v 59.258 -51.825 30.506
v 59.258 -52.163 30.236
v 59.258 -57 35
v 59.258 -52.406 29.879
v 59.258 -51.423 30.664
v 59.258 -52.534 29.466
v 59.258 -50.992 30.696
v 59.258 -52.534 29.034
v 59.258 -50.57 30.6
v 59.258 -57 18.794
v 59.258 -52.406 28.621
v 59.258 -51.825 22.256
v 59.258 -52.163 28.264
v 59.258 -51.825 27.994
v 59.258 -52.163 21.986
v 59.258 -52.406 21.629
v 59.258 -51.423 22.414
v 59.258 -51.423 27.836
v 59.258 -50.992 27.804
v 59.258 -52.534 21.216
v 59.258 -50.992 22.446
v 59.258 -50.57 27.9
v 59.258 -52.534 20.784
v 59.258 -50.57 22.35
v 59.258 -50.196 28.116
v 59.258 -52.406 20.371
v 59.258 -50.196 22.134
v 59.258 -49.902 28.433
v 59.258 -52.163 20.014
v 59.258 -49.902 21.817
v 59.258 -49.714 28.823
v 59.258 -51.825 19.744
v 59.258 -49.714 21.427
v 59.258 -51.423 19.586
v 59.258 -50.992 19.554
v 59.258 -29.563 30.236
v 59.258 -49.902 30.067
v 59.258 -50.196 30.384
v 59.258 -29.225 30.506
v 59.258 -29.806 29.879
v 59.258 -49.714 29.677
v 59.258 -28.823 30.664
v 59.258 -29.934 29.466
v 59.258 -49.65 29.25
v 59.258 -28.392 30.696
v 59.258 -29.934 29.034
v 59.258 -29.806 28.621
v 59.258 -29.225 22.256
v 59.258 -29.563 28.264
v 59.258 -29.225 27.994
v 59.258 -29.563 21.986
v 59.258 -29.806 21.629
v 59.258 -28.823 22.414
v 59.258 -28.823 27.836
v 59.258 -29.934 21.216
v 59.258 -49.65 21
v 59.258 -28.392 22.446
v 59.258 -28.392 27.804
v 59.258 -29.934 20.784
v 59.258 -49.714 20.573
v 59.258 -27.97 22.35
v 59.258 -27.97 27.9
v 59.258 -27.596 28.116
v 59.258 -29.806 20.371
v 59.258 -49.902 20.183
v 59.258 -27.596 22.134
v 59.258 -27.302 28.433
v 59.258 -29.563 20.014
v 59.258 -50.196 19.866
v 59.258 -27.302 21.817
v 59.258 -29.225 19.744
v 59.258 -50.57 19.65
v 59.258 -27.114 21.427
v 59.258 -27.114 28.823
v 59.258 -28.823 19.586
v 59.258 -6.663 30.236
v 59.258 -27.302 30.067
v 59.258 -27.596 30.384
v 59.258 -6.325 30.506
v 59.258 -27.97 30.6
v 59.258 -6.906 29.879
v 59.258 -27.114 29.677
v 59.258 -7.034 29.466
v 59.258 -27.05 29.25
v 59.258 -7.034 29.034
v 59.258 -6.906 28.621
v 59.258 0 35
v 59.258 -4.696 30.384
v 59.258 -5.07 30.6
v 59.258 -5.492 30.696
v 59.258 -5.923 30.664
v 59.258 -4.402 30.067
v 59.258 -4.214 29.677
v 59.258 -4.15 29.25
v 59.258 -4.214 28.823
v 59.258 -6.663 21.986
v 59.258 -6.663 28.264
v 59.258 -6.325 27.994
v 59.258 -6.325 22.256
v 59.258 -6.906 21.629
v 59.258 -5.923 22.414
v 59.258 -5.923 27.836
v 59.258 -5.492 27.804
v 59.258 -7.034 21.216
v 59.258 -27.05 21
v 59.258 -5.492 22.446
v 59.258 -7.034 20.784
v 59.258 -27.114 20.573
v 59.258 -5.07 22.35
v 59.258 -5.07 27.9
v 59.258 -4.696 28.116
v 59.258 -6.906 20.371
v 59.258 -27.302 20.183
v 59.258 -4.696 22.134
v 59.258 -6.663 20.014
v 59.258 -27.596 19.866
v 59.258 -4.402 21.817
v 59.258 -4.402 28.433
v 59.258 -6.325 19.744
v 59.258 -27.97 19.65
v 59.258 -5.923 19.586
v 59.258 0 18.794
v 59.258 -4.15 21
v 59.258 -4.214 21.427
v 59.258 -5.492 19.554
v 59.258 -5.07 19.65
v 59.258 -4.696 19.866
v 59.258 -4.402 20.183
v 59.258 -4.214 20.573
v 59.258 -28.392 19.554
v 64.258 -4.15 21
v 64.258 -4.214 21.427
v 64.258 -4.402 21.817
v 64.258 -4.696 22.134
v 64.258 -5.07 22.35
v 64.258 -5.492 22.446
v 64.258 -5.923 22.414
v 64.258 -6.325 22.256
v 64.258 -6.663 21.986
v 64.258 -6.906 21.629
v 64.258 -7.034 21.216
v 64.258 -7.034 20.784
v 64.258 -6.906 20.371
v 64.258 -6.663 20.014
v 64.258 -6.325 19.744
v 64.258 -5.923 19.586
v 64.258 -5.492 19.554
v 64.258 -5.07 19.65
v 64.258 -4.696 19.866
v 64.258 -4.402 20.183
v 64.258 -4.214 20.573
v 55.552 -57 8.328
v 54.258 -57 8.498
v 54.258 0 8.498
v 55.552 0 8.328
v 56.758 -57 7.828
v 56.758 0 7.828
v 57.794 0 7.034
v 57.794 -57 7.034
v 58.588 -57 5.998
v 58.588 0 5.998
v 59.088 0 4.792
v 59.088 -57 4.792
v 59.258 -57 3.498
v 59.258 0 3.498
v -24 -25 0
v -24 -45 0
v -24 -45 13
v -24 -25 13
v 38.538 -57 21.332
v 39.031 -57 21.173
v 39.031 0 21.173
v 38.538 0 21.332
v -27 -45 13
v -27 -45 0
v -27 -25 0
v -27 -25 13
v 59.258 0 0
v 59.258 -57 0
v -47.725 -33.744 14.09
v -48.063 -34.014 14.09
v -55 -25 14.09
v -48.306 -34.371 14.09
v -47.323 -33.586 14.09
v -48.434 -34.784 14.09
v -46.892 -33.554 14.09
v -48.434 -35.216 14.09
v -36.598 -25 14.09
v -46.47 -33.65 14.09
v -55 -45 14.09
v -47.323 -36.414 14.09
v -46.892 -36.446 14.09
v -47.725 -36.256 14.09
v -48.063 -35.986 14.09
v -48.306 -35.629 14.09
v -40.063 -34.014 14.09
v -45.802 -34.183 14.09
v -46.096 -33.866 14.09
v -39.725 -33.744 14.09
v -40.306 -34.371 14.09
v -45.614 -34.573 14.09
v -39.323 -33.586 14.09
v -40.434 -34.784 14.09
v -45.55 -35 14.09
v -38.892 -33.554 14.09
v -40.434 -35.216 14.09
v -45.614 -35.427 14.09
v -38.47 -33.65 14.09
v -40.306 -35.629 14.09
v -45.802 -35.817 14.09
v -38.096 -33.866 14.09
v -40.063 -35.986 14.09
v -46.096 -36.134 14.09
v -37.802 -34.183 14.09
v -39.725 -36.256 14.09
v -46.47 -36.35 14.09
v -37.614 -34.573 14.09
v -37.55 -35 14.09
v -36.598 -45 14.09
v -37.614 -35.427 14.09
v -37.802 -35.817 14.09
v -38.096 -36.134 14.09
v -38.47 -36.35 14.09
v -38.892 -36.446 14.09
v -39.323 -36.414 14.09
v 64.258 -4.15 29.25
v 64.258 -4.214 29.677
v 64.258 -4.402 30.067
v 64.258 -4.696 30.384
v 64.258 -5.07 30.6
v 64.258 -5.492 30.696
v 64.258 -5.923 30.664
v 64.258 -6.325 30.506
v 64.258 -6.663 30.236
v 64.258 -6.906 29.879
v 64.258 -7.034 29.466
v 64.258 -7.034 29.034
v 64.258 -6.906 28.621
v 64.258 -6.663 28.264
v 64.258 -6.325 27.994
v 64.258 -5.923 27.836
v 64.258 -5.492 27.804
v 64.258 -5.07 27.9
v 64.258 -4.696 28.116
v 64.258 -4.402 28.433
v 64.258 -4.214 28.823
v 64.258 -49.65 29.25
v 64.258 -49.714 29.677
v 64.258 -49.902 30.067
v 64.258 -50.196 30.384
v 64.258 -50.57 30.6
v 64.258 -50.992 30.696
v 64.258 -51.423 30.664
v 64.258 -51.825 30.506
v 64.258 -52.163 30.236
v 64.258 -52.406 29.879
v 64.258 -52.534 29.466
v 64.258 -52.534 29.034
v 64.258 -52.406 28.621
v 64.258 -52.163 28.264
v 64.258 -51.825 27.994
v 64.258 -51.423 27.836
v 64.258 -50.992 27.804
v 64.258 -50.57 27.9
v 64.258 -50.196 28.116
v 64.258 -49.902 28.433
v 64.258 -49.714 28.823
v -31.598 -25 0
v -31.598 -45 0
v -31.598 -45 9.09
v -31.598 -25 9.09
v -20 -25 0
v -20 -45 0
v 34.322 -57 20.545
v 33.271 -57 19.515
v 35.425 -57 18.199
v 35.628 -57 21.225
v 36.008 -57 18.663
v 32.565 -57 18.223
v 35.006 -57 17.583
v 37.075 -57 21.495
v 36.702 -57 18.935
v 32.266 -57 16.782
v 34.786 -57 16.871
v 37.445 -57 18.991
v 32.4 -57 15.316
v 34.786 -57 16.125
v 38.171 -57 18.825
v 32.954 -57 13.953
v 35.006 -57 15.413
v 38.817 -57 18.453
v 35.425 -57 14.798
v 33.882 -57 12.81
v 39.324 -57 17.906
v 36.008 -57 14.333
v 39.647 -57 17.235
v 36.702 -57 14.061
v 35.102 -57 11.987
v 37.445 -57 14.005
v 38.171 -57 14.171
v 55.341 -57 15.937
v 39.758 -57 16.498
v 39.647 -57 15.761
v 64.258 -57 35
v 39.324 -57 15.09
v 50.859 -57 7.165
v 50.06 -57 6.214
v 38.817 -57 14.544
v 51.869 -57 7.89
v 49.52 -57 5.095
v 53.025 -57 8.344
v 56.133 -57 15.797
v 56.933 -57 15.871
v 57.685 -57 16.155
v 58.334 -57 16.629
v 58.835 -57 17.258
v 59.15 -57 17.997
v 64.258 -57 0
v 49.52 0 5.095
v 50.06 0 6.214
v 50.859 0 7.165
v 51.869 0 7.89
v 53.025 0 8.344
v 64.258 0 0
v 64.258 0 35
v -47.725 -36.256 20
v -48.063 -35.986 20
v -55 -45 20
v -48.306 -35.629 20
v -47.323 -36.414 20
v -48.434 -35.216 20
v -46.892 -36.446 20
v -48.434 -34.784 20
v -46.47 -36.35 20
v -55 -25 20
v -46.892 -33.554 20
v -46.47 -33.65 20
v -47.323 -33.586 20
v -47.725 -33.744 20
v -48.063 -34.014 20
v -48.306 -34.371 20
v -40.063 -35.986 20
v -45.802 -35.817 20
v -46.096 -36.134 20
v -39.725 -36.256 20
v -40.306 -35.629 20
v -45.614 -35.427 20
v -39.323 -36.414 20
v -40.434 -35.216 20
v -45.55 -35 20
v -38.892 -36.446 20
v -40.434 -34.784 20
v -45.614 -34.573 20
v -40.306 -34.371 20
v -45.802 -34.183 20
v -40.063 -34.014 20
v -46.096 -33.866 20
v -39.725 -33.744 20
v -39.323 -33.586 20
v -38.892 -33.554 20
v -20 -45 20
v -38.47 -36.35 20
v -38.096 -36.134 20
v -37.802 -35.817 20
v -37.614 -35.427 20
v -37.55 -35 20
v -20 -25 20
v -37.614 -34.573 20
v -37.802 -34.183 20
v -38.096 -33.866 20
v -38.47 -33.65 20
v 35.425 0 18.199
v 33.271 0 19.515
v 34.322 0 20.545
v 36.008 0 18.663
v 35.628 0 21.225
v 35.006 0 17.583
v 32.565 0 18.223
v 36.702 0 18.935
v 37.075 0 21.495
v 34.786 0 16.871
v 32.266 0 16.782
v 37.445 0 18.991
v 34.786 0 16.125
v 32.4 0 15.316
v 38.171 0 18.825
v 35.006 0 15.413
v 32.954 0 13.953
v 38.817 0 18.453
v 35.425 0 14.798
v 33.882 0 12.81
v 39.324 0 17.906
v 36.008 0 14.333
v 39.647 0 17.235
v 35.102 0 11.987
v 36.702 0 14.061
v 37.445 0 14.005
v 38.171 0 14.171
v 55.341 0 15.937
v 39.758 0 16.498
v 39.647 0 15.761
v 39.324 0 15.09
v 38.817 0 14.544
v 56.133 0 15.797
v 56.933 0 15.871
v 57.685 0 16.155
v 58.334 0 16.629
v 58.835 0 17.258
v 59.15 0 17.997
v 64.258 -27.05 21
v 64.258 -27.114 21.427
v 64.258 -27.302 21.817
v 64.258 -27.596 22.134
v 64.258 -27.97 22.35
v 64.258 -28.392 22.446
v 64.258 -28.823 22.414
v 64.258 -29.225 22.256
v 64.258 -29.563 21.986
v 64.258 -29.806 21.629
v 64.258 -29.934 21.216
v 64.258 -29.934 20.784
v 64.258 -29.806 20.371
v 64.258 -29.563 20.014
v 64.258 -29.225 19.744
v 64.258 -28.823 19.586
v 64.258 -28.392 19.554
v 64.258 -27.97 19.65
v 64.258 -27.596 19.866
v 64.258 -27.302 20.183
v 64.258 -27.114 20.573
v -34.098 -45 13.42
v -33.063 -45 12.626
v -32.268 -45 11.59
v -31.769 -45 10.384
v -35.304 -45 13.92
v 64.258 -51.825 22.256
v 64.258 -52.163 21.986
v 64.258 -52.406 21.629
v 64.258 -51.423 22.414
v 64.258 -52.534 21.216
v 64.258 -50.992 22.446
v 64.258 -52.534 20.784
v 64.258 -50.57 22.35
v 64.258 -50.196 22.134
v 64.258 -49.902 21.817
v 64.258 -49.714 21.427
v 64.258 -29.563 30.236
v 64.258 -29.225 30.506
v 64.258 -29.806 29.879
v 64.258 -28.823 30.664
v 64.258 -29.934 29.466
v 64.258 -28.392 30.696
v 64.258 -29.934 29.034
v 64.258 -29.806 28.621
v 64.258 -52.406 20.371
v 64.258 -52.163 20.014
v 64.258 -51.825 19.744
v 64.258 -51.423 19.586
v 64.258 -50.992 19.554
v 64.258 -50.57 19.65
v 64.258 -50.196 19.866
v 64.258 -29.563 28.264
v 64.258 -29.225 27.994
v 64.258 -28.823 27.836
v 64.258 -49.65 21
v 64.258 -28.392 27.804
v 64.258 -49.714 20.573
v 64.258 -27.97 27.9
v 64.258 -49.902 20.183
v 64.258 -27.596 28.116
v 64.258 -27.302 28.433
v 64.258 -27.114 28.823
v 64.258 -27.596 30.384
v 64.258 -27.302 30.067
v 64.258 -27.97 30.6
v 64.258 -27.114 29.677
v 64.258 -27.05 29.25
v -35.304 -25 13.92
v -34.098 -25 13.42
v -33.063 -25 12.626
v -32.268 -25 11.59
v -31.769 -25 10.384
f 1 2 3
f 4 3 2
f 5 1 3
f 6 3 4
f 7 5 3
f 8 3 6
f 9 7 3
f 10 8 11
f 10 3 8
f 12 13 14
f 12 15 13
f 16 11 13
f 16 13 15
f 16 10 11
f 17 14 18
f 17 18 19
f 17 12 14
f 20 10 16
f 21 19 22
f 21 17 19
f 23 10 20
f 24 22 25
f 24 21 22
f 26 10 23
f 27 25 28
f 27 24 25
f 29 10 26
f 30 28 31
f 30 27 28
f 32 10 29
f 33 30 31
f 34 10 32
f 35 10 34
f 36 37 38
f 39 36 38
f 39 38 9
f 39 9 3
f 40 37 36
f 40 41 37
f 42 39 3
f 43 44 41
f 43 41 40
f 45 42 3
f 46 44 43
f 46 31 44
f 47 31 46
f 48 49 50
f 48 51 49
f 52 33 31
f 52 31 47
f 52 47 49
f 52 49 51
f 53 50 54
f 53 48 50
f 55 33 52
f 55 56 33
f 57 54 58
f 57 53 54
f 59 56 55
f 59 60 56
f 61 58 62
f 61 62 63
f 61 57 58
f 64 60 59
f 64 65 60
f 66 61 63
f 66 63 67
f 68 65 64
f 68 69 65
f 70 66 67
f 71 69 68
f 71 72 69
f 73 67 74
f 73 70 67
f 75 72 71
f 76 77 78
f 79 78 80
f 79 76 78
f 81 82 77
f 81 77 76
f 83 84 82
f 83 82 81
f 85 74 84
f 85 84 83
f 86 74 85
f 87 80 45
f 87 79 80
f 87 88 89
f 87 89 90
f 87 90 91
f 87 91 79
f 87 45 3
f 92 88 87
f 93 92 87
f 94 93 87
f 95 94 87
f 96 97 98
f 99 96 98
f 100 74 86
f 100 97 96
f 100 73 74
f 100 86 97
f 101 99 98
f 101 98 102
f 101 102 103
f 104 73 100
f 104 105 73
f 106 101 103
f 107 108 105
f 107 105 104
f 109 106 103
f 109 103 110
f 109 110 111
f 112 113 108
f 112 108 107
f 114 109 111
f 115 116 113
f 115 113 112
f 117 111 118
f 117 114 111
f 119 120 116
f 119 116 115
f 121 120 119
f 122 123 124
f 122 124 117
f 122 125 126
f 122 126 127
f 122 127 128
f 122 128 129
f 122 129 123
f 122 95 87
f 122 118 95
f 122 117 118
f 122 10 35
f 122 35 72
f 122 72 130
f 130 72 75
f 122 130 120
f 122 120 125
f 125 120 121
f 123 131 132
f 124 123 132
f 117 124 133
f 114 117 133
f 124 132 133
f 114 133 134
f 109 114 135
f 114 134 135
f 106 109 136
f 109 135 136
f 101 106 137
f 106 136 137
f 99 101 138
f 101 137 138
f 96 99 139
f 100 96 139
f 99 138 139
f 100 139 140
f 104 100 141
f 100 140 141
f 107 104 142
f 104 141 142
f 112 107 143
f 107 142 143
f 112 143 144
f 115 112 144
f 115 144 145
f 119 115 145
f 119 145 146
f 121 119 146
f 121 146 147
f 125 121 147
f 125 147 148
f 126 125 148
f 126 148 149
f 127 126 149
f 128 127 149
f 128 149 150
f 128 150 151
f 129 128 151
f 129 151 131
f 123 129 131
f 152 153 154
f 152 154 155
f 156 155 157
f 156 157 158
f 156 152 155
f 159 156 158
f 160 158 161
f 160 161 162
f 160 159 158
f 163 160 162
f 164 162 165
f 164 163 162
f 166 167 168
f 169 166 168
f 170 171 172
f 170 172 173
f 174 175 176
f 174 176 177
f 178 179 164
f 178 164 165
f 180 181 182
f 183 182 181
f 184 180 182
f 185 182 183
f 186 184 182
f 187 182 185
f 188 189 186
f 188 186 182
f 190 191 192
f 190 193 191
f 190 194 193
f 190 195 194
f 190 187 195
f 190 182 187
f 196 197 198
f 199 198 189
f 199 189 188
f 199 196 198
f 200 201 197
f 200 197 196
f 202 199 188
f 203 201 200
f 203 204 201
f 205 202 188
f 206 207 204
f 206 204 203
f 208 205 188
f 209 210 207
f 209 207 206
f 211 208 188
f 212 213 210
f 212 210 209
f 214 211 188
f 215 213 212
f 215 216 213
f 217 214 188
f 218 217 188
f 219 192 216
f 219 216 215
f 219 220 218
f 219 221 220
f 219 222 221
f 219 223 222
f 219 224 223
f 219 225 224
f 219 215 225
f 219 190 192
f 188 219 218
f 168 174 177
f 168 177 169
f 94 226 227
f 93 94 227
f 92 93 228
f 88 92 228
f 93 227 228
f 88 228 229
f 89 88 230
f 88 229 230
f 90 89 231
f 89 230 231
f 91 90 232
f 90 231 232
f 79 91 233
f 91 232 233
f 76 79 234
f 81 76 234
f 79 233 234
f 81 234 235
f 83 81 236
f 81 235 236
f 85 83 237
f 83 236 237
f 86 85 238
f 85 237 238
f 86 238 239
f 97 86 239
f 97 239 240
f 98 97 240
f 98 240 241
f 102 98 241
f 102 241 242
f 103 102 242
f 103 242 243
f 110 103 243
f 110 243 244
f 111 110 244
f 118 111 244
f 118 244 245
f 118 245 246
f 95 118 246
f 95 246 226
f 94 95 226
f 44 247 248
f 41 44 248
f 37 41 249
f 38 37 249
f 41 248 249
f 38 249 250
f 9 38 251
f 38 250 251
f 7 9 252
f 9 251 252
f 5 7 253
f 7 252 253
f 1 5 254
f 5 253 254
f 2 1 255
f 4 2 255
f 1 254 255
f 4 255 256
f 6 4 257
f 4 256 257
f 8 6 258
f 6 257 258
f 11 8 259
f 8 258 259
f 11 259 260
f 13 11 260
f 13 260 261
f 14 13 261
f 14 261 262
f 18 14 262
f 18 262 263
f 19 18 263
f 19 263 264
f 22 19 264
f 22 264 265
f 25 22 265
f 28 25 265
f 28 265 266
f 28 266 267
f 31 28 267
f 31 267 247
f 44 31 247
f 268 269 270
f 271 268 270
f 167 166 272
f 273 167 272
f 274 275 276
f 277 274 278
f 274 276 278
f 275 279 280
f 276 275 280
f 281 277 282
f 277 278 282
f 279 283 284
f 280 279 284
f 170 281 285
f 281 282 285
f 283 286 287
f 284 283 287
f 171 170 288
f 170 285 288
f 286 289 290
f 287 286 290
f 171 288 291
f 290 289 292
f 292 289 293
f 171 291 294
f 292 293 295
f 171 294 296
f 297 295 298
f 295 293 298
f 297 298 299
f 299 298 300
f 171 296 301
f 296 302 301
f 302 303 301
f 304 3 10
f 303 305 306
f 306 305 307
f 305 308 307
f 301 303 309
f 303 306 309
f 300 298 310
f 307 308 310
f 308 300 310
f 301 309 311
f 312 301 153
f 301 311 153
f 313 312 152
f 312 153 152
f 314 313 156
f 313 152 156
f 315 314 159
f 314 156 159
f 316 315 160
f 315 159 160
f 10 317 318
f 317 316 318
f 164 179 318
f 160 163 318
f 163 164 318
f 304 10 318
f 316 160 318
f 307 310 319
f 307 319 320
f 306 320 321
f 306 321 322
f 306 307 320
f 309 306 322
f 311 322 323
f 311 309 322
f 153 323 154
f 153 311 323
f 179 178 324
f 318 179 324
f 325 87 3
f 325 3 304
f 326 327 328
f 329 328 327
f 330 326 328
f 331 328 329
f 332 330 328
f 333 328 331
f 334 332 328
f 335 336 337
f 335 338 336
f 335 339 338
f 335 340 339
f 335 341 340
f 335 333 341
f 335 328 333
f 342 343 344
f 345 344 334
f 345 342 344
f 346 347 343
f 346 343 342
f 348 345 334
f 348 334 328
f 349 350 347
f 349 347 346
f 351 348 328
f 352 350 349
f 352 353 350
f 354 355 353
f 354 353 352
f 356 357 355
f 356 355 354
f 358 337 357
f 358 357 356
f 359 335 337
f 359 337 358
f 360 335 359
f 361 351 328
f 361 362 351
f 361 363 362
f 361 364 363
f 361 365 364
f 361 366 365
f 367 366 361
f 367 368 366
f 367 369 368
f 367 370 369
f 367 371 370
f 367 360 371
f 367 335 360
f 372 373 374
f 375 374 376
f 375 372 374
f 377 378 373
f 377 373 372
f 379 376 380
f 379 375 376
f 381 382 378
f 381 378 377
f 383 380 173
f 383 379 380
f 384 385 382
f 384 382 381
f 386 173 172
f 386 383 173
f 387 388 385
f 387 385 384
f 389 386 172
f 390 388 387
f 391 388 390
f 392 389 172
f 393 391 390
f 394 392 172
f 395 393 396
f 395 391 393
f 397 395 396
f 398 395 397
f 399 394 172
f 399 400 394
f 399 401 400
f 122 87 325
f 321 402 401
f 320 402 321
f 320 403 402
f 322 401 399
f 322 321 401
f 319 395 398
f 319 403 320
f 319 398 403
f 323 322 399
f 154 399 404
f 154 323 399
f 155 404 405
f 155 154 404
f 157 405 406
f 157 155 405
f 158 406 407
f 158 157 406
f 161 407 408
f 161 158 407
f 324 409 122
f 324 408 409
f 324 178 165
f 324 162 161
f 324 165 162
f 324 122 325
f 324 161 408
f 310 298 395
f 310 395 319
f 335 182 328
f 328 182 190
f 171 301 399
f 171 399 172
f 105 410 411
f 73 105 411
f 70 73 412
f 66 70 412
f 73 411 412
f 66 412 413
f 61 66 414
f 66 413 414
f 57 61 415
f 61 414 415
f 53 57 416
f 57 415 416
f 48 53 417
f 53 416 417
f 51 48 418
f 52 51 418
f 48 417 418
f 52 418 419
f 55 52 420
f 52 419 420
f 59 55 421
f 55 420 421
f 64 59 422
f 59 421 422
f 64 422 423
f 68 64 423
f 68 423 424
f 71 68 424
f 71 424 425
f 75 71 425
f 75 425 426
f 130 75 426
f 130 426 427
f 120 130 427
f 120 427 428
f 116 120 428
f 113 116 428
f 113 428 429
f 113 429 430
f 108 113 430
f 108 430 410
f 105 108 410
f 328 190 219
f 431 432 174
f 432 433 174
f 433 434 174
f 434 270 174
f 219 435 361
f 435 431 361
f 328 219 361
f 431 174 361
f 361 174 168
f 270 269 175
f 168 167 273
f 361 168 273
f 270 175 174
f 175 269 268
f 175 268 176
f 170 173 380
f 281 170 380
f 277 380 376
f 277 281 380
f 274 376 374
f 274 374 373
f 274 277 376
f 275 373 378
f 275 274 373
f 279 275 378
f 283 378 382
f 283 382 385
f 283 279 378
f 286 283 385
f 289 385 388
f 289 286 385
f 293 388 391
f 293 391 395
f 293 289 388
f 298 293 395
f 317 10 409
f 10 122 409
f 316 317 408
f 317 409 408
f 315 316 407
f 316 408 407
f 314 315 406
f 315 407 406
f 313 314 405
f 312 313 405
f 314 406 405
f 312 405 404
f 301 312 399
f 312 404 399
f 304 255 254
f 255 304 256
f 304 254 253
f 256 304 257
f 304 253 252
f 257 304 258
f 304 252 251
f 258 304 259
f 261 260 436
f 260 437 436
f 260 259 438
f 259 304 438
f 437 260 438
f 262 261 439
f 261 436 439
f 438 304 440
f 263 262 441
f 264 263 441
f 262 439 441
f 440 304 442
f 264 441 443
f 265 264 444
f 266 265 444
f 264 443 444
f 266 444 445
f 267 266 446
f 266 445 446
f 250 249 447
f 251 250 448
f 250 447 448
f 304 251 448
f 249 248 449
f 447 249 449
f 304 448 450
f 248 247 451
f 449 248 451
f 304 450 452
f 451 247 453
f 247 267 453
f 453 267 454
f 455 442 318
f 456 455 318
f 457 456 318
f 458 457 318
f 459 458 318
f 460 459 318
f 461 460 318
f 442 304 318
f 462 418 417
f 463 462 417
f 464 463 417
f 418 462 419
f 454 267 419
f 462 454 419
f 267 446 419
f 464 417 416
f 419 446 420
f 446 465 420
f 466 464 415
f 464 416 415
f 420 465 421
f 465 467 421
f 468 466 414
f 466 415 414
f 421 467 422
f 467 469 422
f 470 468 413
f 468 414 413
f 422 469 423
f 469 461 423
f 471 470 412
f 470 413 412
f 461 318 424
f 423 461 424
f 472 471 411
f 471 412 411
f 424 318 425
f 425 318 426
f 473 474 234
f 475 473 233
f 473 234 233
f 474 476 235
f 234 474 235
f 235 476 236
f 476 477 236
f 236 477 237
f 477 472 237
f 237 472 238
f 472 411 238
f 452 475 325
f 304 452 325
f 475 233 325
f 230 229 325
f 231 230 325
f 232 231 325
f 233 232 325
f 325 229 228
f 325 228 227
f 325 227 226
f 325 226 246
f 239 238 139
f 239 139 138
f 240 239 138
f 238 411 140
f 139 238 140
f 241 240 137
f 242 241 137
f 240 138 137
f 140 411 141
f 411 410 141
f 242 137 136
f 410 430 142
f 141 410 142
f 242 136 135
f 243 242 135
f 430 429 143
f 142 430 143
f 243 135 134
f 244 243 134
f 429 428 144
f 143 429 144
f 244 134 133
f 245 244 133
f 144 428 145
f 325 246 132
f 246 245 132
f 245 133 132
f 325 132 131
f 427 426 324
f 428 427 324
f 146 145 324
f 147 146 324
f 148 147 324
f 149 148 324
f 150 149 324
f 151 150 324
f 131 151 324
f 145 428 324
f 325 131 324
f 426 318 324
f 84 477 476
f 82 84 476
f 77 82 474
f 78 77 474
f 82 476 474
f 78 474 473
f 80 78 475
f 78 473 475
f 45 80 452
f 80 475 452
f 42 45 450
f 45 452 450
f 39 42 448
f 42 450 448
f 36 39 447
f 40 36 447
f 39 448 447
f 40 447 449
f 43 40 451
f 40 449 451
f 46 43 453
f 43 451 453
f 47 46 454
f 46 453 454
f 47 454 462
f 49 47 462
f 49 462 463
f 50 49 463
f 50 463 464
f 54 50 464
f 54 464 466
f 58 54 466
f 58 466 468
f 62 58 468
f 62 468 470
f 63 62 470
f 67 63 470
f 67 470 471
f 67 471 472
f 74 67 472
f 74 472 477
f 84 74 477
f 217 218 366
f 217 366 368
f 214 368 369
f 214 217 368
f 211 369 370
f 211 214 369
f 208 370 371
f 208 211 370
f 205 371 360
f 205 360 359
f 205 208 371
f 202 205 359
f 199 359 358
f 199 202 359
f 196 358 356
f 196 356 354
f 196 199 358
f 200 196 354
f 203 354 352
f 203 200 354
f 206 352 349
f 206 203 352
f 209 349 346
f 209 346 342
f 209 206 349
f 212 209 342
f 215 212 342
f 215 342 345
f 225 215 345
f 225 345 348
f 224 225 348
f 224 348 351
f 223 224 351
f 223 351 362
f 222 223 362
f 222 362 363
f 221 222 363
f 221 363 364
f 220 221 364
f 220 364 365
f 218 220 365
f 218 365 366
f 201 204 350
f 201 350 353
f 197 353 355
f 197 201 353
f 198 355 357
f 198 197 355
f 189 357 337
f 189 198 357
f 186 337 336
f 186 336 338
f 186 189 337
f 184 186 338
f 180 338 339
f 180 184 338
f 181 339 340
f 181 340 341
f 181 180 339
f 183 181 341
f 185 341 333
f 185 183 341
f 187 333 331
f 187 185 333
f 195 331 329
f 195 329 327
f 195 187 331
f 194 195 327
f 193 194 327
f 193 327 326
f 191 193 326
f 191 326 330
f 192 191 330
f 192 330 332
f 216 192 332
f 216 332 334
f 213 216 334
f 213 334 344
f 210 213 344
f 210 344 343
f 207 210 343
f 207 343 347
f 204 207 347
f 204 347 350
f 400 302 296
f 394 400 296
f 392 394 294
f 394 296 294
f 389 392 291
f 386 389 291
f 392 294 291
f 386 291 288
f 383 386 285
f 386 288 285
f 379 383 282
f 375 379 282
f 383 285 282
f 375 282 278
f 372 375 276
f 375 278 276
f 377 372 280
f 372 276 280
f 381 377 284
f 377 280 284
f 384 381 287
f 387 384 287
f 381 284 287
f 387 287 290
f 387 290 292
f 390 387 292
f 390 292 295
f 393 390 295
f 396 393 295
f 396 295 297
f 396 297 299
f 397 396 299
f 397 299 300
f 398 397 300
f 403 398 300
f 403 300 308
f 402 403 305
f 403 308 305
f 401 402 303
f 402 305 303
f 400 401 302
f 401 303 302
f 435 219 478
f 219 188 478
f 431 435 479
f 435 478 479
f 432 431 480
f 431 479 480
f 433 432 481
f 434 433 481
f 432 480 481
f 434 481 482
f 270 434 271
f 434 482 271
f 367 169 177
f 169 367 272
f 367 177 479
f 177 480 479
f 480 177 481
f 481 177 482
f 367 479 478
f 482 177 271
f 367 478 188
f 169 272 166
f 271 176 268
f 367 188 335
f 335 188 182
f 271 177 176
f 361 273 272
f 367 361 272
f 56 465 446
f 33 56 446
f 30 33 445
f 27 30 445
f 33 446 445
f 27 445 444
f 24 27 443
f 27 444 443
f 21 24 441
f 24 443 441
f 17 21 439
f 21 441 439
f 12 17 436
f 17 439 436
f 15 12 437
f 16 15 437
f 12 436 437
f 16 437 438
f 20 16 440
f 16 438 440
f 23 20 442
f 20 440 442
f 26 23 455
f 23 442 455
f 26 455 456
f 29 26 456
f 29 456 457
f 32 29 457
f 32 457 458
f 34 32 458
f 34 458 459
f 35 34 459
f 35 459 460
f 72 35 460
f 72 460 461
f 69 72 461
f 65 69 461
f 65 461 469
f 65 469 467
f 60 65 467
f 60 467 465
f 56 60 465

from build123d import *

# Parameters (mm, degrees)
F0_R      = 1.45
F1_DEPTH  = 20
F2_W      = 5
F2_H      = 57
F3_DEPTH  = 35
F4_R      = 1.45
F5_DEPTH  = 25
F6_W      = 3
F6_H      = 13
F6_W_2    = 23.4017784894
F6_H_2    = 14.0902716666
F7_DEPTH  = 25
F8_R      = 5
F9_R      = 2.5
F10_DEPTH = 57
F11_R     = 3


with BuildPart() as f1:
    # F0 (on Top) → F1 (new body)
    with BuildSketch(Plane.XY):
        Polygon((-55, -25), (-55, -45), (-20, -45), (-20, -25), (-30, -25), align=None)
        with Locations((-47, -35)):
            Circle(F0_R, mode=Mode.SUBTRACT)
        with Locations((-39, -35)):
            Circle(F0_R, mode=Mode.SUBTRACT)
    extrude(amount=F1_DEPTH)

    # F6 (on face) → F7 (cut)
    with BuildSketch(Plane.XZ.offset(45)):
        with Locations((-25.5, 6.5)):
            Rectangle(F6_W, F6_H)
        with Locations((-43.2991107553, 7.0451358333)):
            Rectangle(F6_W_2, F6_H_2)
    extrude(amount=-F7_DEPTH, mode=Mode.SUBTRACT)

    # F8
    f8_edges = [f1.edges().sort_by_distance(p)[0] for p in [
        (-31.598222, -35, 14.090272),
    ]]
    fillet(f8_edges, radius=F8_R)


with BuildPart() as f3:
    # F2 (on Top) → F3 (new body)
    with BuildSketch(Plane.XY):
        with Locations((61.7580251396, -28.5)):
            Rectangle(F2_W, F2_H)
    extrude(amount=F3_DEPTH)

    # F4 (on face) → F5 (cut)
    with BuildSketch(Plane.YZ.offset(64.2580251396)):
        with Locations((-28.5, 21)):
            Circle(F4_R)
        with Locations((-28.5, 29.25)):
            Circle(F4_R)
        with Locations((-5.6, 29.25)):
            Circle(F4_R)
        with Locations((-5.6, 21)):
            Circle(F4_R)
        with Locations((-51.1, 29.25)):
            Circle(F4_R)
        with Locations((-51.1, 21)):
            Circle(F4_R)
    extrude(amount=-F5_DEPTH, mode=Mode.SUBTRACT)

    # F9 (on face) → F10 (join)
    with BuildSketch(Plane.XZ.offset(57)):
        with BuildLine():
            ThreePointArc((49.5200200917, 5.0953693625), (51.3413838746, 7.5592704233), (54.2580251396, 8.49808787))
            ThreePointArc((54.2580251396, 8.49808787), (57.7935590368, 7.0336217846), (59.2580251396, 3.4980878947))
            Line((59.2580251396, 3.4980878947), (59.2580251396, 14.680092223))
            Line((59.2580251396, 14.680092223), (39.0309278948, 21.1732152287))
            Line((39.0309278948, 21.1732152287), (38.5375044289, 21.3316096448))
            ThreePointArc((38.5375044289, 21.3316096448), (32.5651577951, 18.2234852408), (35.1017983979, 11.986914382))
            Line((35.1017983979, 11.986914382), (49.5200200917, 5.0953693625))
        make_face()
        with Locations((37.2580251396, 16.49808787)):
            Circle(F9_R, mode=Mode.SUBTRACT)
    extrude(amount=-F10_DEPTH)

    # F11
    f11_edges = [f3.edges().sort_by_distance(p)[0] for p in [
        (59.258025, -28.5, 14.680092),
    ]]
    fillet(f11_edges, radius=F11_R)


solid = Compound([f1.part, f3.part])
